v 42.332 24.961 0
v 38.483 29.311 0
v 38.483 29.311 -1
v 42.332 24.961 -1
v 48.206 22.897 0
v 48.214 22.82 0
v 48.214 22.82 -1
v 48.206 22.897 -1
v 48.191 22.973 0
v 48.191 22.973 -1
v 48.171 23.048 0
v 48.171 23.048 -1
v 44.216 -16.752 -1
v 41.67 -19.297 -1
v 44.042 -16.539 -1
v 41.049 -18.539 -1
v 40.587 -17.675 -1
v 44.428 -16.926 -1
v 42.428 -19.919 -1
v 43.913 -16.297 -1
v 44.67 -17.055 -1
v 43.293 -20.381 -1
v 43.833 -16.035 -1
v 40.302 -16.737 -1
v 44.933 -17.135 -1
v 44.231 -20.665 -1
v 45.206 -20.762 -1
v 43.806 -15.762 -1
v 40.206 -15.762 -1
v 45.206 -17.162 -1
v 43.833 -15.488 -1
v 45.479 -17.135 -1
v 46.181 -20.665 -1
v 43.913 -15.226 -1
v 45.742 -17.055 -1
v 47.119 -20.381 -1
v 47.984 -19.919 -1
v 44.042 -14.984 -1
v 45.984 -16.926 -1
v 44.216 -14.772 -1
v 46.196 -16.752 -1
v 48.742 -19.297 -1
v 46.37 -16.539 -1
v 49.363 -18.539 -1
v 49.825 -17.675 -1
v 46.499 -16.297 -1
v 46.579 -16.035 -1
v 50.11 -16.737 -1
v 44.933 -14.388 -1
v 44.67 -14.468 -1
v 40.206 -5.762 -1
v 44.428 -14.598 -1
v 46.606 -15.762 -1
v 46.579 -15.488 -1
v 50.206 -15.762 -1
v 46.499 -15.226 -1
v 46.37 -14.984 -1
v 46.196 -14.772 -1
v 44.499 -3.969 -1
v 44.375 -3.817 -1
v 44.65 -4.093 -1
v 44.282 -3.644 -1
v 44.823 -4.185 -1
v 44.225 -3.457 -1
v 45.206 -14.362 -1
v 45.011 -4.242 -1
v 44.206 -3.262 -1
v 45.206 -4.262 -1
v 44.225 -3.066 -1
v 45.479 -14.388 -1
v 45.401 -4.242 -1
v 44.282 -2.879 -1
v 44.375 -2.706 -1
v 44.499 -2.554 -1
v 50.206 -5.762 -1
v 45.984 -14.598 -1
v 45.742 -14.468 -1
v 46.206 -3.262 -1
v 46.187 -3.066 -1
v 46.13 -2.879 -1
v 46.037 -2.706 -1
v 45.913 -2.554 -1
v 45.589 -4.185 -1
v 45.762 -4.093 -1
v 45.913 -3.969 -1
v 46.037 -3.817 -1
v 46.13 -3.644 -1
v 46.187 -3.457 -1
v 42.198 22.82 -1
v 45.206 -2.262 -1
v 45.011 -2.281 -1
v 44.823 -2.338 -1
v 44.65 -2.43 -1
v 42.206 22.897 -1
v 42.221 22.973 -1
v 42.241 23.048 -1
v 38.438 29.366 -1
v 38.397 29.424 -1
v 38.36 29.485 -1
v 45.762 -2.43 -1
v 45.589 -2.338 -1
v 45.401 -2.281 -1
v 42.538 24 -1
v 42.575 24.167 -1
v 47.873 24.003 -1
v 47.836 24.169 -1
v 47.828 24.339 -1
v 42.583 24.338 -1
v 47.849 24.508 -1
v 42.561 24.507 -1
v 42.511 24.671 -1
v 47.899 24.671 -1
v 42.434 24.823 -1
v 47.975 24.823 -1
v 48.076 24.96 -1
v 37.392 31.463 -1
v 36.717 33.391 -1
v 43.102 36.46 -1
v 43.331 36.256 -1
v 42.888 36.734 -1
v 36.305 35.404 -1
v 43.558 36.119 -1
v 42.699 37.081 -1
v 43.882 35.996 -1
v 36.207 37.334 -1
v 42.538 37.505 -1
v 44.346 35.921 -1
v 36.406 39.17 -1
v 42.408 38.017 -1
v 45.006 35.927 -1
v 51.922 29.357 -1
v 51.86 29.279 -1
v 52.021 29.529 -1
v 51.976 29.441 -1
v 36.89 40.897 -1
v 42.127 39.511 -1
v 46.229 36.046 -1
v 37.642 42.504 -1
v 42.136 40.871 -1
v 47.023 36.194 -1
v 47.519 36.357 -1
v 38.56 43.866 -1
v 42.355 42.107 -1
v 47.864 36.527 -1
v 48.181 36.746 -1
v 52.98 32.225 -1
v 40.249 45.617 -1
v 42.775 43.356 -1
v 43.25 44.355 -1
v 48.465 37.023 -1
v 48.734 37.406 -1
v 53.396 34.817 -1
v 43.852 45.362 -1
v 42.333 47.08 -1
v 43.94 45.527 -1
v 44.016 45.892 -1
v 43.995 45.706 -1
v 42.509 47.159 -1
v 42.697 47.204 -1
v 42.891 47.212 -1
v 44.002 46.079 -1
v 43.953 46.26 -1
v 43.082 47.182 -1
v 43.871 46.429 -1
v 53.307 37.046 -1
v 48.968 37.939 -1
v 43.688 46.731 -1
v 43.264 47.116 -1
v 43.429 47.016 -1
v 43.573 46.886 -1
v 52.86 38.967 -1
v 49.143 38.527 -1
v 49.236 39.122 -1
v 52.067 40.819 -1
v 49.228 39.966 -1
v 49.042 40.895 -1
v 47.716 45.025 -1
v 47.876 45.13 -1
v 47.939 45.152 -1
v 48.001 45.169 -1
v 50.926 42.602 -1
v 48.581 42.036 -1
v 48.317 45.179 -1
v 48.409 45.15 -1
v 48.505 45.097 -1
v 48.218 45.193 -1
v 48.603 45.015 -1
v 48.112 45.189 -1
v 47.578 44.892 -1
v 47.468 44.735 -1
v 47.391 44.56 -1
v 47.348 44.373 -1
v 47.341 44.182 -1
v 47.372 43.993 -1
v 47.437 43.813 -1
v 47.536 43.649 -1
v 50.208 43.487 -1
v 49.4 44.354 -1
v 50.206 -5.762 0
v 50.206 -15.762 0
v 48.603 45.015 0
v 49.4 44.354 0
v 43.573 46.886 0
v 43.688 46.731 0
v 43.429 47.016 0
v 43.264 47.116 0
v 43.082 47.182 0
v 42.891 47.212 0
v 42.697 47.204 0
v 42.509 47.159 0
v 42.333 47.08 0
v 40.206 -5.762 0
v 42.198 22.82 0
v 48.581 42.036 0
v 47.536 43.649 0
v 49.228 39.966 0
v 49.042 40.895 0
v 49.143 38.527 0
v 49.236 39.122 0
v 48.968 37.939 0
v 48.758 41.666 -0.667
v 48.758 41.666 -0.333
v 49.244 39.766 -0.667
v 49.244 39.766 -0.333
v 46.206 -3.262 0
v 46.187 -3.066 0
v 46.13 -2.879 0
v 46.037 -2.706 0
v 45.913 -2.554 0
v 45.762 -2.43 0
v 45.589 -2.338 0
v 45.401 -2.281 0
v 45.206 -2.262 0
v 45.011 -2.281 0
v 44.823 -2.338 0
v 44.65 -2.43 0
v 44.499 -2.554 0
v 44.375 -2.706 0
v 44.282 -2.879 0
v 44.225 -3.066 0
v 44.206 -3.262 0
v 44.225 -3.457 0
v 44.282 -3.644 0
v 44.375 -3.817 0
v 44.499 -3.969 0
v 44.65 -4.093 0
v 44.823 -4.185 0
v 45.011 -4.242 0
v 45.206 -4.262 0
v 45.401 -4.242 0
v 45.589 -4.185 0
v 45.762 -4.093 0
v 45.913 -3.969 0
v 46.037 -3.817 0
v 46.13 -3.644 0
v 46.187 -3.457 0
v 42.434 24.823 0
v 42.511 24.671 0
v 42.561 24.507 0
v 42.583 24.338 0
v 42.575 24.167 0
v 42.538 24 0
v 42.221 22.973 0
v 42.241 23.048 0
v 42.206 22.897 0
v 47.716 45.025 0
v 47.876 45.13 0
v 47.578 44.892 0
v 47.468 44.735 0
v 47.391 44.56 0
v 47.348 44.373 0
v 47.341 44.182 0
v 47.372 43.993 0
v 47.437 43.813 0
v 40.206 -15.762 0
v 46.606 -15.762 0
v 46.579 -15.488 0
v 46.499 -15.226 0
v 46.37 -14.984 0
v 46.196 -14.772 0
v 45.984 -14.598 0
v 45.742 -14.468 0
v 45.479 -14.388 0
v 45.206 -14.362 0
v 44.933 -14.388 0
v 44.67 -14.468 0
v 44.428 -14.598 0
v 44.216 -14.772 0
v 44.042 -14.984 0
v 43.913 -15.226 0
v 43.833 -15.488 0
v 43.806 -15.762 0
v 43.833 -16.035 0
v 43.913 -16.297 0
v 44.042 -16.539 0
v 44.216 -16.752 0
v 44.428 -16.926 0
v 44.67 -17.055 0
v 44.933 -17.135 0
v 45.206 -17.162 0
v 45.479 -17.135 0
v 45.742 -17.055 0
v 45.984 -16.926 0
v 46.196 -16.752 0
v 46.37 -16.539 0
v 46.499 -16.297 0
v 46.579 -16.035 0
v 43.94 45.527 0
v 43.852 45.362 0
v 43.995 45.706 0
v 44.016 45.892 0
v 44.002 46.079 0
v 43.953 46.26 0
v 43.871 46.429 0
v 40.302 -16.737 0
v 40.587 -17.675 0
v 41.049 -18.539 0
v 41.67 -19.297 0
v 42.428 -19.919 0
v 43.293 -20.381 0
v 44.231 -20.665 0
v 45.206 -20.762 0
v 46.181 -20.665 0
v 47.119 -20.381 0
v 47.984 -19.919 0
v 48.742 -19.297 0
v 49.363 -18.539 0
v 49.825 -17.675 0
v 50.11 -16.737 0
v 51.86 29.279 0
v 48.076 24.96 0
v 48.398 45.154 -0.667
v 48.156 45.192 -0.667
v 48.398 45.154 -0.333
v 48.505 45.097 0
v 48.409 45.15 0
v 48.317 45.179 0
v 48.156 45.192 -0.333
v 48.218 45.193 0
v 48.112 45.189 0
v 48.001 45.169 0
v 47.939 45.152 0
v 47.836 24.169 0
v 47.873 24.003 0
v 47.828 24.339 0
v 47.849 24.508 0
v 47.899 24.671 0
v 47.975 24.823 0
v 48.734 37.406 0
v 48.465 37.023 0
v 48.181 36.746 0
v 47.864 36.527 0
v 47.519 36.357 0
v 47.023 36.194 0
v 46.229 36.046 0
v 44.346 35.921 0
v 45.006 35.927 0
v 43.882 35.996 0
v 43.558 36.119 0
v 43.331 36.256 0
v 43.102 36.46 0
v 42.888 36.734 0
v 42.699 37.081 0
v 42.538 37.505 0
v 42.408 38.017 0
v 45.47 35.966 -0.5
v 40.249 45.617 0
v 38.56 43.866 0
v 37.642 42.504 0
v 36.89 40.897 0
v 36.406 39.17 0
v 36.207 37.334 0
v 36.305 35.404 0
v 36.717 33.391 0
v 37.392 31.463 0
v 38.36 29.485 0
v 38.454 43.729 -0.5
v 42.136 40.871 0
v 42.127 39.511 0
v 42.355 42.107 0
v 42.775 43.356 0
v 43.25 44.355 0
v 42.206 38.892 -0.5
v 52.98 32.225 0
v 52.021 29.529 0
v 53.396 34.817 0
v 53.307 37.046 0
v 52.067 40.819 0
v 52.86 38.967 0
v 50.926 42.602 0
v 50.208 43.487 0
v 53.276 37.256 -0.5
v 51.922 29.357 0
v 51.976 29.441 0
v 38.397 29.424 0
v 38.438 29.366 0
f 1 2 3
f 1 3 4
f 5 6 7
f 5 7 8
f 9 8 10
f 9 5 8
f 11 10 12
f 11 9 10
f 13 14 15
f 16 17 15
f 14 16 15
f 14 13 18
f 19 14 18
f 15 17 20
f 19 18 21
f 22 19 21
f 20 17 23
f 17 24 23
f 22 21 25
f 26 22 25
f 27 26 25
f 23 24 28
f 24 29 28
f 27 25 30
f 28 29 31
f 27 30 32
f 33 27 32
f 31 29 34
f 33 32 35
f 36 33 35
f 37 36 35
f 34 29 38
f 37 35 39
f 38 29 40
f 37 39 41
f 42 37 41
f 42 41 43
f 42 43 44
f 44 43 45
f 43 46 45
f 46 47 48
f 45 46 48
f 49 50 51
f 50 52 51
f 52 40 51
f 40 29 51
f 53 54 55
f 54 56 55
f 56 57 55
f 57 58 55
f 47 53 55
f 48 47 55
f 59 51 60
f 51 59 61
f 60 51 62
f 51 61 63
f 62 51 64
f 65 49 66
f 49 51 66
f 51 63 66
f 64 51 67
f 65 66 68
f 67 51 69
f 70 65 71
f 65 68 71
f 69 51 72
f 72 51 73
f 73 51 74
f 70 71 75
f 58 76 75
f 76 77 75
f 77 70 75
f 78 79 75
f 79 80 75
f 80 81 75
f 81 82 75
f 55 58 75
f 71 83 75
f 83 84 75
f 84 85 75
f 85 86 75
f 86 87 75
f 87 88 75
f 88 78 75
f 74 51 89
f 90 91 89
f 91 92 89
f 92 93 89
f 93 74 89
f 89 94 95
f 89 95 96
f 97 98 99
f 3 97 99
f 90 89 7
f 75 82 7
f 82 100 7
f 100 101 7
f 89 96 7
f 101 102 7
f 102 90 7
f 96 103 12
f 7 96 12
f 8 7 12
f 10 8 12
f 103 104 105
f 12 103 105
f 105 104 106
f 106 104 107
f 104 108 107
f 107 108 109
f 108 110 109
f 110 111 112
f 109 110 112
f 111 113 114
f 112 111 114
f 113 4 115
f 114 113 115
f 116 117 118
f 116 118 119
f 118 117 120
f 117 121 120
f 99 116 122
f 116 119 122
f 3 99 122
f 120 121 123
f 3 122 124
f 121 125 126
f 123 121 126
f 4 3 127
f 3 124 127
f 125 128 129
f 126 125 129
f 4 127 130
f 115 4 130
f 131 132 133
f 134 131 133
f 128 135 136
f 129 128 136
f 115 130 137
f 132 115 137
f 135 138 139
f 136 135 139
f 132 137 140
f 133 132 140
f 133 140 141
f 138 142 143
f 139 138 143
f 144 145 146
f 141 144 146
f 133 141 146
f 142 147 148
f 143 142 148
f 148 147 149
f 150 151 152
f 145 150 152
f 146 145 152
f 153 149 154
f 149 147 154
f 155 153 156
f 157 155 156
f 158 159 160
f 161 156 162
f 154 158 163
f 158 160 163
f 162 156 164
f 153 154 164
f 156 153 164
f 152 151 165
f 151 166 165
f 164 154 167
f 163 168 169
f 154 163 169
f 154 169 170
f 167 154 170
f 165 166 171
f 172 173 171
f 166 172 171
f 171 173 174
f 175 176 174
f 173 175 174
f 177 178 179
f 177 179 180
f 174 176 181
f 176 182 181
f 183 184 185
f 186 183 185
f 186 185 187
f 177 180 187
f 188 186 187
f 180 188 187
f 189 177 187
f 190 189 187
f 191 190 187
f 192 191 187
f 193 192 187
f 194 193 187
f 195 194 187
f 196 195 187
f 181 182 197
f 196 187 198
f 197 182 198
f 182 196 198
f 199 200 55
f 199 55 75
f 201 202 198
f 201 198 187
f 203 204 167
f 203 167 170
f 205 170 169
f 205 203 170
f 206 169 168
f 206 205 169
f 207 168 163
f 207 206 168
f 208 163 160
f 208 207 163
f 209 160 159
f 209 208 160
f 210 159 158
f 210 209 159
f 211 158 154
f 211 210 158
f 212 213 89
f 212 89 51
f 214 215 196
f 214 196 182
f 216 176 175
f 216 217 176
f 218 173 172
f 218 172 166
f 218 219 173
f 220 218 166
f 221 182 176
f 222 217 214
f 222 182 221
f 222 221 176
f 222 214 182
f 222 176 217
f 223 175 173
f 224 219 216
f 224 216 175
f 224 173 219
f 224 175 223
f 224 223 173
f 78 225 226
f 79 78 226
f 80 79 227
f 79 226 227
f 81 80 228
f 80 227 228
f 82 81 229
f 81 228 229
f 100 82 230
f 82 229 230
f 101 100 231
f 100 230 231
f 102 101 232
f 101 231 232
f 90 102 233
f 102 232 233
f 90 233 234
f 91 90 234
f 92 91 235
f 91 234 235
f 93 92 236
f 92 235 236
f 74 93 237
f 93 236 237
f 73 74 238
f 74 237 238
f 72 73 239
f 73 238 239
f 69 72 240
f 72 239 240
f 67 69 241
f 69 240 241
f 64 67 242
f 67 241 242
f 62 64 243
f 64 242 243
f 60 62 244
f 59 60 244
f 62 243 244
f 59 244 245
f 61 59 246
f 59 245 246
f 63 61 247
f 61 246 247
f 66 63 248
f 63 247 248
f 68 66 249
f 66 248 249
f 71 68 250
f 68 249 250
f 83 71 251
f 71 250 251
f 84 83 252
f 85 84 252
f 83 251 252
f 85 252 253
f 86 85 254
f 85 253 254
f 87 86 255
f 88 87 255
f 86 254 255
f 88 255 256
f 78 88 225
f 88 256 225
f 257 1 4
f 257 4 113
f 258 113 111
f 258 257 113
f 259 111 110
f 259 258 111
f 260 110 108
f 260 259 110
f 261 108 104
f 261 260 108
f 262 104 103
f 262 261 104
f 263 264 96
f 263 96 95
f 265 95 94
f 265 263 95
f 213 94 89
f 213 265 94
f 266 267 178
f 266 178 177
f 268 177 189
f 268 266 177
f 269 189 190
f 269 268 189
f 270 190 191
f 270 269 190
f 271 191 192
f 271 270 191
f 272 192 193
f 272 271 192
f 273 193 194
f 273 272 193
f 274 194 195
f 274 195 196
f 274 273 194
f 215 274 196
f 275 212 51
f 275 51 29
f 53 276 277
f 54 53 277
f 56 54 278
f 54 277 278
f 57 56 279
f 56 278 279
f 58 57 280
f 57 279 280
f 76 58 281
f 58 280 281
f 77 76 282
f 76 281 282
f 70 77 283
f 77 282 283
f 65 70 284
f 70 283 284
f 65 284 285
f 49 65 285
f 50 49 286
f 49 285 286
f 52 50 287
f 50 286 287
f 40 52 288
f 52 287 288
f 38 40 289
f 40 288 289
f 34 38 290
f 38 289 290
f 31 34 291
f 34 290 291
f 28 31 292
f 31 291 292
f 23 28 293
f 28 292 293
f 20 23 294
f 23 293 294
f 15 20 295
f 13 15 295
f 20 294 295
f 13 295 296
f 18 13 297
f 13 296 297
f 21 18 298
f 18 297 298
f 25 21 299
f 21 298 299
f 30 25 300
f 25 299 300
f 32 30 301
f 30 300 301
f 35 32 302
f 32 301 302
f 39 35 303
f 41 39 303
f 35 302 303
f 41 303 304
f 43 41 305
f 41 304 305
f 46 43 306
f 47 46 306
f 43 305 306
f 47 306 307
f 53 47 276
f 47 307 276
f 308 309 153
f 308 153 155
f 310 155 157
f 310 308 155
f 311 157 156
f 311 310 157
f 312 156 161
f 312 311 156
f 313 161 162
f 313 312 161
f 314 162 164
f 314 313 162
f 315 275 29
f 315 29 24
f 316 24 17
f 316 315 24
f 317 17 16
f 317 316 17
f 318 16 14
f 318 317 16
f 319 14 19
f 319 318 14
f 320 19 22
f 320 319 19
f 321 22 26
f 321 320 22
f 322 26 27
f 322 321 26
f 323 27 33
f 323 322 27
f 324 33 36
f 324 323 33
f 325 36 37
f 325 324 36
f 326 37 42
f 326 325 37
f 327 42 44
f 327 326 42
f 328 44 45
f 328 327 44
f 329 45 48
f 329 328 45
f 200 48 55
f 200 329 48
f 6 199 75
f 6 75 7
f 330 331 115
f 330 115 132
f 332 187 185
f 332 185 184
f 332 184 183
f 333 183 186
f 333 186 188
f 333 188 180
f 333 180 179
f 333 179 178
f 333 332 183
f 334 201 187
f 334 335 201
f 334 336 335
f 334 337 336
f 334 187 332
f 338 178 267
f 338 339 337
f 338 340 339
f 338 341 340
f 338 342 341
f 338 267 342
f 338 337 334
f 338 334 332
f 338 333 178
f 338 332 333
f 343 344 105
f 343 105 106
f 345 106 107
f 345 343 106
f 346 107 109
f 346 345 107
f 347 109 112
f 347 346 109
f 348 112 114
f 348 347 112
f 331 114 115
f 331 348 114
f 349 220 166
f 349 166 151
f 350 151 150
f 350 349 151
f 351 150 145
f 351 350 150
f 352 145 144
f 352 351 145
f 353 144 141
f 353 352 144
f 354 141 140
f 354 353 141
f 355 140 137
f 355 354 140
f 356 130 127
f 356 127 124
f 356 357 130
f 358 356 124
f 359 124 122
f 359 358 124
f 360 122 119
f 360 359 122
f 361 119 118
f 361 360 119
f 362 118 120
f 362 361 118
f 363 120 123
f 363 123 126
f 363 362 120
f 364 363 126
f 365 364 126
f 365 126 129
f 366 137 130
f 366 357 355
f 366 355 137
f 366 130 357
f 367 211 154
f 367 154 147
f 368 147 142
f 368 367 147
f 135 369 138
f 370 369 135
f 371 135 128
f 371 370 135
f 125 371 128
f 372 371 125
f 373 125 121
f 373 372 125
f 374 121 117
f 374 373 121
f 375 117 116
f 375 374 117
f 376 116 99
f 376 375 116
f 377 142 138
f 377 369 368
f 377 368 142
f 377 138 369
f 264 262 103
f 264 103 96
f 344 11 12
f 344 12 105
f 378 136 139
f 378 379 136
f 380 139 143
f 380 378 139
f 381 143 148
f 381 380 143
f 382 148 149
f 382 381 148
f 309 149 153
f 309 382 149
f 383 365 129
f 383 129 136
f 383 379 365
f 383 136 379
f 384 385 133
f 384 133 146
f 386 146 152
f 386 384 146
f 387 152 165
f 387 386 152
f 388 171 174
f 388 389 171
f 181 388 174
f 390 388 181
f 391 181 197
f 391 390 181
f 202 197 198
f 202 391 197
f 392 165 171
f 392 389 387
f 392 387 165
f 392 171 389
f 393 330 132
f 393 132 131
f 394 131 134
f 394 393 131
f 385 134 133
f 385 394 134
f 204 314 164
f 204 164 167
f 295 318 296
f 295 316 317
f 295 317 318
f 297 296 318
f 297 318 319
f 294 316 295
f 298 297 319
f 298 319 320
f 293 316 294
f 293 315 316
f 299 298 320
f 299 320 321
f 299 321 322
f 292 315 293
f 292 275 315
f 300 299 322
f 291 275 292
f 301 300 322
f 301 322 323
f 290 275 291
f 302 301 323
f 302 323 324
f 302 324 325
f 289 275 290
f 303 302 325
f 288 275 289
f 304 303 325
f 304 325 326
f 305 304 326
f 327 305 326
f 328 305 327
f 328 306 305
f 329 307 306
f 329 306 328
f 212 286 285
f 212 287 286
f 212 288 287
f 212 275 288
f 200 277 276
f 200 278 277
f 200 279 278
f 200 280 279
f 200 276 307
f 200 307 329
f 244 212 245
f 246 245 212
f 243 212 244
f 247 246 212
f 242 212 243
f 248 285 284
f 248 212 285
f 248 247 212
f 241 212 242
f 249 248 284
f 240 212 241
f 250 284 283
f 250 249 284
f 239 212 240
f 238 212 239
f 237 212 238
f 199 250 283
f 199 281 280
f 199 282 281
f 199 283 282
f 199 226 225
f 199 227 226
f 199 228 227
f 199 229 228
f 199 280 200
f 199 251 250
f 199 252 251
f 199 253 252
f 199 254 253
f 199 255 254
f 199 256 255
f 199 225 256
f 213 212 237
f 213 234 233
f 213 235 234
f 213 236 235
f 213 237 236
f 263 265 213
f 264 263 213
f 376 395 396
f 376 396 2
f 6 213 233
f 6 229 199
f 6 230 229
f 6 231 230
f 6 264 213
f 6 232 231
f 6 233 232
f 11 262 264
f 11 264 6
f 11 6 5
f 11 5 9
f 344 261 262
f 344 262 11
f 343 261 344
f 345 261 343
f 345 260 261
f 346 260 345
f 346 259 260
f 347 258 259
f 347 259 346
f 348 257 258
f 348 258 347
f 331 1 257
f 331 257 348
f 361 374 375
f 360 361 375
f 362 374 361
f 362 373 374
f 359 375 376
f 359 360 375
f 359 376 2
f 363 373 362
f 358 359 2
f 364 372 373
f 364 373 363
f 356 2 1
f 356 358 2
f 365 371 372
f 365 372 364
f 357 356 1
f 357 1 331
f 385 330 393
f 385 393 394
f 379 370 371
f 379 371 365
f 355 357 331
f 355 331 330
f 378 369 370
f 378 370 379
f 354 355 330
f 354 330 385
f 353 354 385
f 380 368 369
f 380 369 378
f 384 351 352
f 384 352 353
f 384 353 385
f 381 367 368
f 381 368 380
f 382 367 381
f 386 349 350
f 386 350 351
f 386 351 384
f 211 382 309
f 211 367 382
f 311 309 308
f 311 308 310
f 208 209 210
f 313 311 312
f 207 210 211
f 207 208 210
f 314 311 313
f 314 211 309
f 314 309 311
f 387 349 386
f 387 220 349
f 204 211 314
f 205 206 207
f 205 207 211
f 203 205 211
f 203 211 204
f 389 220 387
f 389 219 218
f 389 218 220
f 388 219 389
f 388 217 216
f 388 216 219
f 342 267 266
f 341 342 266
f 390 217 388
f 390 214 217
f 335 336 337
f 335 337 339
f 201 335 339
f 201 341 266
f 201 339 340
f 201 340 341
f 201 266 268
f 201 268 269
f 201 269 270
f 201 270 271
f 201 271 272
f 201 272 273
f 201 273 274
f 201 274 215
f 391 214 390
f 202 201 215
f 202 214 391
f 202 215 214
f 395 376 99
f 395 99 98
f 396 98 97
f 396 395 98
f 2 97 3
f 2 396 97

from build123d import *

# Parameters (mm, degrees)
MODEL_R           = 1.4
MODEL_R_2         = 1
BRIDA_BASE1_DEPTH = 1


# Sheet-metal steps are written as plain solids
with BuildPart() as part:
    # Model → Brida base1 (new body)
    with BuildSketch(Plane.XY):
        with BuildLine():
            Line((43.871435578, 46.428949543), (43.688273589, 46.731359657))
            ThreePointArc((43.688273589, 46.731359657), (43.081772243, 47.181843562), (42.333236398, 47.079502368))
            add(Edge.make_bspline(
                [(42.333236398, 47.079502368), (40.764422927, 46.174489073), (35.816548406, 41.900747821), (35.272083644, 35.001949339), (38.359716274, 29.485408266)],
                knots=[0.004002738, 0.004002738, 0.004002738, 0.004002738, 0.255811026, 0.955465838, 0.955465838, 0.955465838, 0.955465838], degree=3))
            ThreePointArc((38.359716274, 29.485408266), (38.416879113, 29.394992141), (38.483372908, 29.311199296))
            Line((38.483372908, 29.311199296), (42.332361737, 24.960661438))
            ThreePointArc((42.332361737, 24.960661438), (42.561250074, 24.507363364), (42.537981803, 24.000088683))
            Line((42.537981803, 24.000088683), (42.240856149, 23.048171958))
            ThreePointArc((42.240856149, 23.048171958), (42.212695742, 22.935208537), (42.197855138, 22.819737764))
            Line((42.197855138, 22.819737764), (40.2059904, -5.7615616))
            Line((40.2059904, -5.7615616), (40.2059904, -15.7615616))
            ThreePointArc((40.2059904, -15.7615616), (45.2059904, -20.7615616), (50.2059904, -15.7615616))
            Line((50.2059904, -15.7615616), (50.2059904, -5.7615616))
            Line((50.2059904, -5.7615616), (48.214125662, 22.819737764))
            ThreePointArc((48.214125662, 22.819737764), (48.199285058, 22.935208537), (48.171124651, 23.048171958))
            Line((48.171124651, 23.048171958), (47.873069238, 24.0030674))
            ThreePointArc((47.873069238, 24.0030674), (47.849307461, 24.508023196), (48.075555852, 24.960081428))
            Line((48.075555852, 24.960081428), (51.860338986, 29.27914154))
            ThreePointArc((51.860338986, 29.27914154), (51.94992334, 29.398217661), (52.020818692, 29.529283781))
            add(Edge.make_bspline(
                [(52.020818692, 29.529283781), (53.24372236, 32.258428286), (54.100570293, 37.543385576), (51.577752865, 42.166423069), (49.399716108, 44.353895199)],
                knots=[0.073238818, 0.073238818, 0.073238818, 0.073238818, 0.521565521, 0.992417875, 0.992417875, 0.992417875, 0.992417875], degree=3))
            Line((49.399716108, 44.353895199), (48.603017078, 45.015390082))
            add(Edge.make_bspline(
                [(48.603017078, 45.015390082), (48.417036758, 45.204787232), (48.174708276, 45.242911079), (47.876031632, 45.129761621)],
                knots=[0, 0, 0, 0, 1, 1, 1, 1], degree=3))
            ThreePointArc((47.876031632, 45.129761621), (47.364904102, 44.467541566), (47.535799978, 43.648651249))
            add(Edge.make_bspline(
                [(47.535799978, 43.648651249), (49.116486798, 41.620539936), (49.633988071, 39.732404237), (48.968154199, 37.939006155)],
                knots=[0, 0, 0, 0, 0.676846712, 0.676846712, 0.676846712, 0.676846712], degree=3))
            add(Edge.make_bspline(
                [(48.968154199, 37.939006155), (48.407530031, 36.24951926), (45.517280844, 35.959596441), (42.879215477, 35.735494746), (42.407543293, 38.017493531)],
                knots=[0, 0, 0, 0, 0.520046034, 1, 1, 1, 1], degree=3))
            add(Edge.make_bspline(
                [(42.407543293, 38.017493531), (42.322809158, 38.308098707), (41.773176484, 40.694157088), (42.398123884, 43.150787581), (43.851661443, 45.361505885)],
                knots=[0.047028419, 0.047028419, 0.047028419, 0.047028419, 0.13151503, 0.738210784, 0.738210784, 0.738210784, 0.738210784], degree=3))
            ThreePointArc((43.851661443, 45.361505885), (44.015919722, 45.892368025), (43.871435578, 46.428949543))
        make_face()
        with Locations((45.2059904, -15.7615616)):
            Circle(MODEL_R, mode=Mode.SUBTRACT)
        with Locations((45.2059904, -3.2615616)):
            Circle(MODEL_R_2, mode=Mode.SUBTRACT)
    extrude(amount=-BRIDA_BASE1_DEPTH)


solid = part.part
